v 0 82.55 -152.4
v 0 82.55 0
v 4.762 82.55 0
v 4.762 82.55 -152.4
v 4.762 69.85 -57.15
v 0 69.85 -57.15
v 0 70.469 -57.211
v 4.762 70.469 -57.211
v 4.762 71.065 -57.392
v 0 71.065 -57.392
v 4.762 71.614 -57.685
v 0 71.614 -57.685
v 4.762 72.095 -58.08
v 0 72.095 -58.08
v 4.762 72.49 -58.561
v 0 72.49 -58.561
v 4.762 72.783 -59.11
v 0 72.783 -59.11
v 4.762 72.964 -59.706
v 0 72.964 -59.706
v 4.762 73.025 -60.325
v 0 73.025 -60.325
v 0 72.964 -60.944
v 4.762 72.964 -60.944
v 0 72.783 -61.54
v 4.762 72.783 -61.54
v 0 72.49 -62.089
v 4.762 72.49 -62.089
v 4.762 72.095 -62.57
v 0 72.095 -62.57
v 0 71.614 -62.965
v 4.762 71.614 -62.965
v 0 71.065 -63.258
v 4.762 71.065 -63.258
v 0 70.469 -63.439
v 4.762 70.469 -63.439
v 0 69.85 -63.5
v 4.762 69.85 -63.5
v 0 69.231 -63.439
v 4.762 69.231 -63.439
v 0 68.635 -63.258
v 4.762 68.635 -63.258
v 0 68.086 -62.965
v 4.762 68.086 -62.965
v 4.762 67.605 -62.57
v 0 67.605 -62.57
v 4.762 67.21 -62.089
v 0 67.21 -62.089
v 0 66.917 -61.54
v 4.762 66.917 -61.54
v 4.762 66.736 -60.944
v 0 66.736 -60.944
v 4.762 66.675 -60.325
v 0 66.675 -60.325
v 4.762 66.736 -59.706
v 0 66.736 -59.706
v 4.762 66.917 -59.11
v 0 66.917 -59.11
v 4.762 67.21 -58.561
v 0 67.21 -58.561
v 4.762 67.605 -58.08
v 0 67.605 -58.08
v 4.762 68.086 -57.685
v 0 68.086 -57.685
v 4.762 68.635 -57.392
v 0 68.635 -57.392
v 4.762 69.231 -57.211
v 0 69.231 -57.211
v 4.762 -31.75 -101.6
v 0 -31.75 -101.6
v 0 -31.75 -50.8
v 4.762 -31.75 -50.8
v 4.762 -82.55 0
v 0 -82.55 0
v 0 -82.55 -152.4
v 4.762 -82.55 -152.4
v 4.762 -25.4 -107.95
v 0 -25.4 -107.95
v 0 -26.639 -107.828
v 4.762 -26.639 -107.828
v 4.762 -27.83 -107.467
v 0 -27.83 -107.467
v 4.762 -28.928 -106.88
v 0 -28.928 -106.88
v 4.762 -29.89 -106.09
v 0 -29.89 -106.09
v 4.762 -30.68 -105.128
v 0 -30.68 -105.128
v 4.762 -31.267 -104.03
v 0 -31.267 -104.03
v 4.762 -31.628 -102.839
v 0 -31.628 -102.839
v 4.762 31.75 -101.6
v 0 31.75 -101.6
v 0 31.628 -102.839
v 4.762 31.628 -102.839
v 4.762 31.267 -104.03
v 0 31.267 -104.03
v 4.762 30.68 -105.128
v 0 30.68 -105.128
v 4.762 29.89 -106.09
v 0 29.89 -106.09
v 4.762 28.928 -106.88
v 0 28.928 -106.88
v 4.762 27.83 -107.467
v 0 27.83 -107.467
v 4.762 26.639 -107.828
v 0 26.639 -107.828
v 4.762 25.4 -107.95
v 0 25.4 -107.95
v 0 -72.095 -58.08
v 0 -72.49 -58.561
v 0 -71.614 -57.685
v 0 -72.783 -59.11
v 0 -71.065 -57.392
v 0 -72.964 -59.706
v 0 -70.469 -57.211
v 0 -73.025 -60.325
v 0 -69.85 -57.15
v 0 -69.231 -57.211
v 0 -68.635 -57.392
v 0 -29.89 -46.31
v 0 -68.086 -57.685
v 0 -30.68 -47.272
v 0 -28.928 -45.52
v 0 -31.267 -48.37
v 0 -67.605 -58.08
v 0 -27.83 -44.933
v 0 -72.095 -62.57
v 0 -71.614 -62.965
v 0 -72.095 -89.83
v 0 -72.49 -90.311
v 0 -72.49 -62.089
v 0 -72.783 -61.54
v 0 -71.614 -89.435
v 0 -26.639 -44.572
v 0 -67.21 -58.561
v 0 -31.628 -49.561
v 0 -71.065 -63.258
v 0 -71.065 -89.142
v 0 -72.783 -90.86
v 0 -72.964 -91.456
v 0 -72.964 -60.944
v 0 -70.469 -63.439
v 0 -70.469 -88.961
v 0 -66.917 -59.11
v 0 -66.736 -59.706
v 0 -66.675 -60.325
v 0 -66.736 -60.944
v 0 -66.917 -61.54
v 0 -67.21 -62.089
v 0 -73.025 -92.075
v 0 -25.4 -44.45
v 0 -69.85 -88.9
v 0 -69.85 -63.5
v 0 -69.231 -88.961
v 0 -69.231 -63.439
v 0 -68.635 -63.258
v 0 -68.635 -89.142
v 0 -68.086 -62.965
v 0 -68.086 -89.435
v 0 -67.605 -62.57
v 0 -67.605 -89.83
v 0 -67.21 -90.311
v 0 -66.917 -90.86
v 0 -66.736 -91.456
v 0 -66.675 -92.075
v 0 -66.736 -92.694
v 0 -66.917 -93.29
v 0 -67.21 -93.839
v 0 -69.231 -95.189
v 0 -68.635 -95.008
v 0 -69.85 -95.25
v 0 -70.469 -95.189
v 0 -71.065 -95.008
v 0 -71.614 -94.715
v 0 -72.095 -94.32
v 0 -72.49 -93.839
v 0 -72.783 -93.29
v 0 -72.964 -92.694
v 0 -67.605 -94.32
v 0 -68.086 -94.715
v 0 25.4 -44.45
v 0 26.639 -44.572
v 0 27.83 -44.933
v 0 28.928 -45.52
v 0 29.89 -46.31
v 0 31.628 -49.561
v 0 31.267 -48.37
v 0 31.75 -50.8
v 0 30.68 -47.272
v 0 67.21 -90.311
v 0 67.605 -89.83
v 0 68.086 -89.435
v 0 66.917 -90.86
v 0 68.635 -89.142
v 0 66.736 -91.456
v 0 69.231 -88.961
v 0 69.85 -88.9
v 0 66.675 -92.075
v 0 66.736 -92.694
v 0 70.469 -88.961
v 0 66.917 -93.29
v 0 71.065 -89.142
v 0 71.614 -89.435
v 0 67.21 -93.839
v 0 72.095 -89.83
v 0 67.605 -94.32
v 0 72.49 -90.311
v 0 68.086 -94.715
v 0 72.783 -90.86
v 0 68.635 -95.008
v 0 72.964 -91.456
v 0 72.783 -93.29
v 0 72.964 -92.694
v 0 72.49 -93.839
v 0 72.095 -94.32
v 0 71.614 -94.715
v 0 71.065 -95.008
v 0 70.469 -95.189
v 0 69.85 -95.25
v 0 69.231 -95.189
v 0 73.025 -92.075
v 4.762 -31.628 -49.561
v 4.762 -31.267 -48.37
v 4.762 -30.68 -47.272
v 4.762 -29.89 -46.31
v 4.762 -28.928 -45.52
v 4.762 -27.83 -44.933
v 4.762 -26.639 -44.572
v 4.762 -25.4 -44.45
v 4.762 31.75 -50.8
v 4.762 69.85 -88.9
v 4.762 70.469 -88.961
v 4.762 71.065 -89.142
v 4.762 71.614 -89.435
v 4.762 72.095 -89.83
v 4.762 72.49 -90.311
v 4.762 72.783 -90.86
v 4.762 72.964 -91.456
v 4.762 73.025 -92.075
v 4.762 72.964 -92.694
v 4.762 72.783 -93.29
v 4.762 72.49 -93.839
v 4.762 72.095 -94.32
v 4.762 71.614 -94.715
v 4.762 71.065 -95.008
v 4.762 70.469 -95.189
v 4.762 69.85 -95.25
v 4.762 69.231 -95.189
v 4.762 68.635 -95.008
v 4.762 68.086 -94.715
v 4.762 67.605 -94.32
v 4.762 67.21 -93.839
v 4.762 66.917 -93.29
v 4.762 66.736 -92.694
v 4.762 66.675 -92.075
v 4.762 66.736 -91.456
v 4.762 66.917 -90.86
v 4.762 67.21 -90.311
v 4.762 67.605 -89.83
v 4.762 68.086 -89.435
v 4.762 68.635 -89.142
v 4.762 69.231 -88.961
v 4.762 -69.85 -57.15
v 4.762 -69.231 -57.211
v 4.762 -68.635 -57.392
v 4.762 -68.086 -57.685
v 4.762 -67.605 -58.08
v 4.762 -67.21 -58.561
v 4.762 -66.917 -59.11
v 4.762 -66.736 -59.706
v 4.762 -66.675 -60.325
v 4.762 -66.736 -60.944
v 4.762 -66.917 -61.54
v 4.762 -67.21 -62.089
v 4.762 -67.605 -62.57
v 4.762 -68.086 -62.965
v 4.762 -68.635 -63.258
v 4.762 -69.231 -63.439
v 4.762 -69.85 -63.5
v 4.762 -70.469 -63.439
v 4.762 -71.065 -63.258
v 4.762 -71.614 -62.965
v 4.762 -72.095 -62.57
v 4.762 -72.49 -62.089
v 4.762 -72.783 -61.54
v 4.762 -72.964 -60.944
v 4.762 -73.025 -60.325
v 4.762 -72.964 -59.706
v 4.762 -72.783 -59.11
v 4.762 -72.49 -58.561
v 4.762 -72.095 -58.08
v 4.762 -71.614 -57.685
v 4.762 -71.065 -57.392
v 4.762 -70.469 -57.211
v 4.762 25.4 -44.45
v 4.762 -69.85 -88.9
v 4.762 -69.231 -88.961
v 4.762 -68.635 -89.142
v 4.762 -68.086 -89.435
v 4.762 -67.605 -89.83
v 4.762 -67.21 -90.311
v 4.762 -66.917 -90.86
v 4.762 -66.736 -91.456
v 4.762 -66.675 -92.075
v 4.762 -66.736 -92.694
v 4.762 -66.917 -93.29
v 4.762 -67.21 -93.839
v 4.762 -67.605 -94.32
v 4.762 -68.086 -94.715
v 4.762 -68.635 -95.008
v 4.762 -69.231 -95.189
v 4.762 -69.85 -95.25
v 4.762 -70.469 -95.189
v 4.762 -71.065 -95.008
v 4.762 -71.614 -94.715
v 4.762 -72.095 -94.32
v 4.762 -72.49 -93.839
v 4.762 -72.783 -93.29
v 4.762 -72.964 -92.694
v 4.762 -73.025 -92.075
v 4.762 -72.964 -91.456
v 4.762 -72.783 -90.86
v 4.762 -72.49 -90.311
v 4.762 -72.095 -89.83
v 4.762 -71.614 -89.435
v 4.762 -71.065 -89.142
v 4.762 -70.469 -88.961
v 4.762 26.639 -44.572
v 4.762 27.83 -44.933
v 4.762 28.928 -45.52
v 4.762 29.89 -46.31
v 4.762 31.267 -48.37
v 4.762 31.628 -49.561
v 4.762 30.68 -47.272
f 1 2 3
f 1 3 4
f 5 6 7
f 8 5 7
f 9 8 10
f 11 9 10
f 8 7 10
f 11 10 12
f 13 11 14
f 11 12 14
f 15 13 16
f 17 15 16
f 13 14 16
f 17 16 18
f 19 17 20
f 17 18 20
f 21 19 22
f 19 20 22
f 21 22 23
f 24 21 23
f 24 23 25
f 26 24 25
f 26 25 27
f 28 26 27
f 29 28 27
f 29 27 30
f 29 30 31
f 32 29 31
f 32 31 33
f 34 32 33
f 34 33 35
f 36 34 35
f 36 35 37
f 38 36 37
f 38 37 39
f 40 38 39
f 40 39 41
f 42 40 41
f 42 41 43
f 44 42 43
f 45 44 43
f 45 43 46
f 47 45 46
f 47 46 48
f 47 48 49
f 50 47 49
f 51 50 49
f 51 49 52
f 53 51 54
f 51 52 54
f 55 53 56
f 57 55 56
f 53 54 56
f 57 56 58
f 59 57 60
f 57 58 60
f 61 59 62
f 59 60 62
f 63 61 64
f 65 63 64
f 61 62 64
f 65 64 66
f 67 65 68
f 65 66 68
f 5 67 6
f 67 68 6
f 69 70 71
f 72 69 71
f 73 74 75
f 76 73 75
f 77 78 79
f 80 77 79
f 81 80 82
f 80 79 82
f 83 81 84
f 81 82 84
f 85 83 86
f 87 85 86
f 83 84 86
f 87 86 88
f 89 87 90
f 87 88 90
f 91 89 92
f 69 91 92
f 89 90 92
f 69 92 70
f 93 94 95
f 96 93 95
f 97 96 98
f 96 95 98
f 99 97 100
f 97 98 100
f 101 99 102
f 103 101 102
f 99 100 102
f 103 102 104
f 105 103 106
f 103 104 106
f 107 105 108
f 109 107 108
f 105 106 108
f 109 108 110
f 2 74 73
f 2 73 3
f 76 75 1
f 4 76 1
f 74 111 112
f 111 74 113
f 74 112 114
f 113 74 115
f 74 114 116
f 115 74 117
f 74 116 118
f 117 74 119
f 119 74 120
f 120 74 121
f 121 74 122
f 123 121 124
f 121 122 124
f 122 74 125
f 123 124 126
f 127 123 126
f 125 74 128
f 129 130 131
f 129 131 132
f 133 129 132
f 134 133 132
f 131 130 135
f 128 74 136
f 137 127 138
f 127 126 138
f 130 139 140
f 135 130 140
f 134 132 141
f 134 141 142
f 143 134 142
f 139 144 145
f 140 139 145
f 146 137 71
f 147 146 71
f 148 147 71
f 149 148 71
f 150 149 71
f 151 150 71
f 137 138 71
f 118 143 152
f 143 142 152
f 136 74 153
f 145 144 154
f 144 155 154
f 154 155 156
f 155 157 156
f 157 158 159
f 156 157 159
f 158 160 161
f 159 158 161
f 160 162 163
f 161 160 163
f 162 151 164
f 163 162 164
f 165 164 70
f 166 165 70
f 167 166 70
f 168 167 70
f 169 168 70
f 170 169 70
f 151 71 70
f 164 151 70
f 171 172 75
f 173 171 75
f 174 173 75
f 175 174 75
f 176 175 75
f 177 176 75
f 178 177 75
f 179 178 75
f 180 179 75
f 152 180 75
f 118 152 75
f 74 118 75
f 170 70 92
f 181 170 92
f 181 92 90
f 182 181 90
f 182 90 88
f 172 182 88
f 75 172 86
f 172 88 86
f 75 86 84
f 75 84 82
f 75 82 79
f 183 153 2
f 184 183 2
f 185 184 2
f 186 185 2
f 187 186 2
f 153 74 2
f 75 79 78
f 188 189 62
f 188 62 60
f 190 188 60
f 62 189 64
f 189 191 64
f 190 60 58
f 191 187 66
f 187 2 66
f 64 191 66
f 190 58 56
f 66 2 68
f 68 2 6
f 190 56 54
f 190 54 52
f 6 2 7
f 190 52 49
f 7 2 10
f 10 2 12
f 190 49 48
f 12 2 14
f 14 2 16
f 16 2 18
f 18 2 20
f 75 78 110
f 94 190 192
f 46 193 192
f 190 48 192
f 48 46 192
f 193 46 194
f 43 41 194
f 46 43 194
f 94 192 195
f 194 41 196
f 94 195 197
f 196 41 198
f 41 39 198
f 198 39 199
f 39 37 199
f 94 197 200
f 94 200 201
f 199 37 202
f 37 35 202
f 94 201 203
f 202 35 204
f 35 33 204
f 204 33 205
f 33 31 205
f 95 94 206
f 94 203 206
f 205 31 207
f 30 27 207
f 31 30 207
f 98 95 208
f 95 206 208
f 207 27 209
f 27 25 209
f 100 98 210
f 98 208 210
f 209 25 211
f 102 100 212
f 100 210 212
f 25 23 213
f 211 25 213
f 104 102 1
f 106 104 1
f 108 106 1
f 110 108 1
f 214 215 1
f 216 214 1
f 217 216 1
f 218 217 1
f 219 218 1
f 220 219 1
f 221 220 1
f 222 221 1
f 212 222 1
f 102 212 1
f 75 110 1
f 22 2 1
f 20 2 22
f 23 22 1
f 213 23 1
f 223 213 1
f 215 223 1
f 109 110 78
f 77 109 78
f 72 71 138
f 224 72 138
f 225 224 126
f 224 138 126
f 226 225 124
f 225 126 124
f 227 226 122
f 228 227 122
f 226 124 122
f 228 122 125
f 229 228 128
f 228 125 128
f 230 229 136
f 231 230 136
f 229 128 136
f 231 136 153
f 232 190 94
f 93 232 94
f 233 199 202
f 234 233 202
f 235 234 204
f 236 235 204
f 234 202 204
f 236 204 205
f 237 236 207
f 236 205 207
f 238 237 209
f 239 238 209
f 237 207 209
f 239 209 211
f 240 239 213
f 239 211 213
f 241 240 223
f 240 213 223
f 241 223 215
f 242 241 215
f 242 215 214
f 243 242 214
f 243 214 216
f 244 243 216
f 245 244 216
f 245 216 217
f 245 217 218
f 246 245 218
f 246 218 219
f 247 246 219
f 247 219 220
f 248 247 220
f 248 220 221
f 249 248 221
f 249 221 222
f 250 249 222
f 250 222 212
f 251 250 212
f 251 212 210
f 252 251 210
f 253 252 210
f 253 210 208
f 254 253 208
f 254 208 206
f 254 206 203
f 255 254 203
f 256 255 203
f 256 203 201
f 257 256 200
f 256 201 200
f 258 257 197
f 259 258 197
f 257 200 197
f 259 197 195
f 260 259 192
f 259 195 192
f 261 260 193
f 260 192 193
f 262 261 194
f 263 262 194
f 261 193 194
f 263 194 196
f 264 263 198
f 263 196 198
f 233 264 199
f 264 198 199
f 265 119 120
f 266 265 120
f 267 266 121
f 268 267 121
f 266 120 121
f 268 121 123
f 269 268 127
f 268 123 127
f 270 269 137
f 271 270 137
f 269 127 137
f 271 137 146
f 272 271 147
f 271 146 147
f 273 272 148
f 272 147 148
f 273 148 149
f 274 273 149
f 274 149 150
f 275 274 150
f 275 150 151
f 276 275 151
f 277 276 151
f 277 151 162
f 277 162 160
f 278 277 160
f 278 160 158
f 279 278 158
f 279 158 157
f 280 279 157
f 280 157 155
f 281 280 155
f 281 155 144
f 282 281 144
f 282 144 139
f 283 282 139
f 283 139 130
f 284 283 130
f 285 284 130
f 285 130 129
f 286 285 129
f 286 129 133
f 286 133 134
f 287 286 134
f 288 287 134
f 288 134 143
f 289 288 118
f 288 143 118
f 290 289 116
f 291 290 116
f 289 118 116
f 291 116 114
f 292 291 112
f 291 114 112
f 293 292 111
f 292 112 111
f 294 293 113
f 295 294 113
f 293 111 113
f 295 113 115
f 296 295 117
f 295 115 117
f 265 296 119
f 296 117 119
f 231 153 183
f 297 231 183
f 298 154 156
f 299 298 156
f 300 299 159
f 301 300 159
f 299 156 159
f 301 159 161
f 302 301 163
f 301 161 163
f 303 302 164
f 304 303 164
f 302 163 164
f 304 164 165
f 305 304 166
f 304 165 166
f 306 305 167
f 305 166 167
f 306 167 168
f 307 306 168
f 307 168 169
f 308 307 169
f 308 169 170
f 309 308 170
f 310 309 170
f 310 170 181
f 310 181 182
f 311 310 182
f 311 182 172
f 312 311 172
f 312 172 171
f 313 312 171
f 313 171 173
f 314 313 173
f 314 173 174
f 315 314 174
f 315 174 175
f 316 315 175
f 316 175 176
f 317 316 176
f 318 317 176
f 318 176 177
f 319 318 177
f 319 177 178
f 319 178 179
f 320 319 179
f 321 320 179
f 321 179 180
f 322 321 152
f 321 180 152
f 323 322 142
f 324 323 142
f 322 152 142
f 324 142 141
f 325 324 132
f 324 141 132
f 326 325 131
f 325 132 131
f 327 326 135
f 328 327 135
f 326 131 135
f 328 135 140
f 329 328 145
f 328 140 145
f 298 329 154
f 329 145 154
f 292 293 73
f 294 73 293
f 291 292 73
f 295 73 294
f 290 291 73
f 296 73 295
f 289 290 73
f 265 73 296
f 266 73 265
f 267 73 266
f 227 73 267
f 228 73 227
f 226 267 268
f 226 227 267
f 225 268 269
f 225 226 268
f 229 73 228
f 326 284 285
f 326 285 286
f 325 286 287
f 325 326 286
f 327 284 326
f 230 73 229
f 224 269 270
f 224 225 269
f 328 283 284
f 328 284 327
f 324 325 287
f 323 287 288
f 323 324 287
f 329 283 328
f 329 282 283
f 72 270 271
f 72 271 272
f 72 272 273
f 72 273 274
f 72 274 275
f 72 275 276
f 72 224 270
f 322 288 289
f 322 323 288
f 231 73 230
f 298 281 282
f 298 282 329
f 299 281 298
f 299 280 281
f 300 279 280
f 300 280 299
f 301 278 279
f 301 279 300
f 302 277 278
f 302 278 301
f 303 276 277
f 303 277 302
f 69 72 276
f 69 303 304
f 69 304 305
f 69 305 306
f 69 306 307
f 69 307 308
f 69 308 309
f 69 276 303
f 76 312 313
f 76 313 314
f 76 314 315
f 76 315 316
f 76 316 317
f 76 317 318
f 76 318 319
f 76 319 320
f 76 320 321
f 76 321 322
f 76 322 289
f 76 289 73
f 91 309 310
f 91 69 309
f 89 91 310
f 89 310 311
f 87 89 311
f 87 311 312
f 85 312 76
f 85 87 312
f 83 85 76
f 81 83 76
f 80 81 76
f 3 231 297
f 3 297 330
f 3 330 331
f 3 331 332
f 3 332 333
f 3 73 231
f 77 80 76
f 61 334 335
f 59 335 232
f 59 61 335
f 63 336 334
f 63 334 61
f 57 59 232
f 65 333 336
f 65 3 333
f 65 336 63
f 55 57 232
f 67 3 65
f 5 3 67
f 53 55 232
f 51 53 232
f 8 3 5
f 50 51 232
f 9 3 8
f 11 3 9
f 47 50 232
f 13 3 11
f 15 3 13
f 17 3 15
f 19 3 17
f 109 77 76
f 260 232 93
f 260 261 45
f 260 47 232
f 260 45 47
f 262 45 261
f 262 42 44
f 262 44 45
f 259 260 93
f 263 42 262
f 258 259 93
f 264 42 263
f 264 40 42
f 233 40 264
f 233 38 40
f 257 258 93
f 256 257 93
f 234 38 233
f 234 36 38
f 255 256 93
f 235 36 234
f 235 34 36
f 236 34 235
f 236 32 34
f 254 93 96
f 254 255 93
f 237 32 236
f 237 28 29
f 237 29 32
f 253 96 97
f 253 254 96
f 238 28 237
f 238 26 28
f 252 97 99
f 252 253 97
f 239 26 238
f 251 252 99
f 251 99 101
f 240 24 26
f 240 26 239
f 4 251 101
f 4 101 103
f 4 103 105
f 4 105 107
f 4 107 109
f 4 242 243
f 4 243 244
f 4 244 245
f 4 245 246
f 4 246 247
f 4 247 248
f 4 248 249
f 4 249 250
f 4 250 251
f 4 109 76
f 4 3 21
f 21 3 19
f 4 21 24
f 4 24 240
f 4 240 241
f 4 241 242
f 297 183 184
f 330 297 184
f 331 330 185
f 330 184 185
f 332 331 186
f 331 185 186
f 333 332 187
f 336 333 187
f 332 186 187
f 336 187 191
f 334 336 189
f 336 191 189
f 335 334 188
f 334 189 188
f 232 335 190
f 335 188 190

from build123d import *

# Parameters (mm, degrees)
SKETCH1_W           = 152.4
SKETCH1_H           = 165.1
BOSS_EXTRUDE1_DEPTH = 4.7625
CUT_EXTRUDE1_DEPTH  = 5.7625
SKETCH3_R           = 3.175
CUT_EXTRUDE2_DEPTH  = 5.7625


with BuildPart() as part:
    # Sketch1 → Boss-Extrude1 (new body)
    with BuildSketch(Plane(origin=(0, 0, 0), x_dir=(0, 0, -1), z_dir=(1, 0, 0))):
        with Locations((76.2, 0)):
            Rectangle(SKETCH1_W, SKETCH1_H)
    extrude(amount=BOSS_EXTRUDE1_DEPTH)

    # Sketch2 → Cut-Extrude1 (cut, through all)
    with BuildSketch(Plane.ZY):
        with BuildLine():
            Line((-107.95, 25.4), (-107.95, -25.4))
            ThreePointArc((-107.95, -25.4), (-106.090128061, -29.890128061), (-101.6, -31.75))
            Line((-101.6, -31.75), (-50.8, -31.75))
            ThreePointArc((-50.8, -31.75), (-46.309871939, -29.890128061), (-44.45, -25.4))
            Line((-44.45, -25.4), (-44.45, 25.4))
            ThreePointArc((-44.45, 25.4), (-46.309871939, 29.890128061), (-50.8, 31.75))
            Line((-50.8, 31.75), (-101.6, 31.75))
            ThreePointArc((-101.6, 31.75), (-106.090128061, 29.890128061), (-107.95, 25.4))
        make_face()
    extrude(amount=-CUT_EXTRUDE1_DEPTH, mode=Mode.SUBTRACT)

    # Sketch3 → Cut-Extrude2 (cut, through all)
    with BuildSketch(Plane.ZY):
        with Locations((-60.325, 69.85)):
            Circle(SKETCH3_R)
        with Locations((-92.075, 69.85)):
            Circle(SKETCH3_R)
        with Locations((-92.075, -69.85)):
            Circle(SKETCH3_R)
        with Locations((-60.325, -69.85)):
            Circle(SKETCH3_R)
    extrude(amount=-CUT_EXTRUDE2_DEPTH, mode=Mode.SUBTRACT)


solid = part.part
